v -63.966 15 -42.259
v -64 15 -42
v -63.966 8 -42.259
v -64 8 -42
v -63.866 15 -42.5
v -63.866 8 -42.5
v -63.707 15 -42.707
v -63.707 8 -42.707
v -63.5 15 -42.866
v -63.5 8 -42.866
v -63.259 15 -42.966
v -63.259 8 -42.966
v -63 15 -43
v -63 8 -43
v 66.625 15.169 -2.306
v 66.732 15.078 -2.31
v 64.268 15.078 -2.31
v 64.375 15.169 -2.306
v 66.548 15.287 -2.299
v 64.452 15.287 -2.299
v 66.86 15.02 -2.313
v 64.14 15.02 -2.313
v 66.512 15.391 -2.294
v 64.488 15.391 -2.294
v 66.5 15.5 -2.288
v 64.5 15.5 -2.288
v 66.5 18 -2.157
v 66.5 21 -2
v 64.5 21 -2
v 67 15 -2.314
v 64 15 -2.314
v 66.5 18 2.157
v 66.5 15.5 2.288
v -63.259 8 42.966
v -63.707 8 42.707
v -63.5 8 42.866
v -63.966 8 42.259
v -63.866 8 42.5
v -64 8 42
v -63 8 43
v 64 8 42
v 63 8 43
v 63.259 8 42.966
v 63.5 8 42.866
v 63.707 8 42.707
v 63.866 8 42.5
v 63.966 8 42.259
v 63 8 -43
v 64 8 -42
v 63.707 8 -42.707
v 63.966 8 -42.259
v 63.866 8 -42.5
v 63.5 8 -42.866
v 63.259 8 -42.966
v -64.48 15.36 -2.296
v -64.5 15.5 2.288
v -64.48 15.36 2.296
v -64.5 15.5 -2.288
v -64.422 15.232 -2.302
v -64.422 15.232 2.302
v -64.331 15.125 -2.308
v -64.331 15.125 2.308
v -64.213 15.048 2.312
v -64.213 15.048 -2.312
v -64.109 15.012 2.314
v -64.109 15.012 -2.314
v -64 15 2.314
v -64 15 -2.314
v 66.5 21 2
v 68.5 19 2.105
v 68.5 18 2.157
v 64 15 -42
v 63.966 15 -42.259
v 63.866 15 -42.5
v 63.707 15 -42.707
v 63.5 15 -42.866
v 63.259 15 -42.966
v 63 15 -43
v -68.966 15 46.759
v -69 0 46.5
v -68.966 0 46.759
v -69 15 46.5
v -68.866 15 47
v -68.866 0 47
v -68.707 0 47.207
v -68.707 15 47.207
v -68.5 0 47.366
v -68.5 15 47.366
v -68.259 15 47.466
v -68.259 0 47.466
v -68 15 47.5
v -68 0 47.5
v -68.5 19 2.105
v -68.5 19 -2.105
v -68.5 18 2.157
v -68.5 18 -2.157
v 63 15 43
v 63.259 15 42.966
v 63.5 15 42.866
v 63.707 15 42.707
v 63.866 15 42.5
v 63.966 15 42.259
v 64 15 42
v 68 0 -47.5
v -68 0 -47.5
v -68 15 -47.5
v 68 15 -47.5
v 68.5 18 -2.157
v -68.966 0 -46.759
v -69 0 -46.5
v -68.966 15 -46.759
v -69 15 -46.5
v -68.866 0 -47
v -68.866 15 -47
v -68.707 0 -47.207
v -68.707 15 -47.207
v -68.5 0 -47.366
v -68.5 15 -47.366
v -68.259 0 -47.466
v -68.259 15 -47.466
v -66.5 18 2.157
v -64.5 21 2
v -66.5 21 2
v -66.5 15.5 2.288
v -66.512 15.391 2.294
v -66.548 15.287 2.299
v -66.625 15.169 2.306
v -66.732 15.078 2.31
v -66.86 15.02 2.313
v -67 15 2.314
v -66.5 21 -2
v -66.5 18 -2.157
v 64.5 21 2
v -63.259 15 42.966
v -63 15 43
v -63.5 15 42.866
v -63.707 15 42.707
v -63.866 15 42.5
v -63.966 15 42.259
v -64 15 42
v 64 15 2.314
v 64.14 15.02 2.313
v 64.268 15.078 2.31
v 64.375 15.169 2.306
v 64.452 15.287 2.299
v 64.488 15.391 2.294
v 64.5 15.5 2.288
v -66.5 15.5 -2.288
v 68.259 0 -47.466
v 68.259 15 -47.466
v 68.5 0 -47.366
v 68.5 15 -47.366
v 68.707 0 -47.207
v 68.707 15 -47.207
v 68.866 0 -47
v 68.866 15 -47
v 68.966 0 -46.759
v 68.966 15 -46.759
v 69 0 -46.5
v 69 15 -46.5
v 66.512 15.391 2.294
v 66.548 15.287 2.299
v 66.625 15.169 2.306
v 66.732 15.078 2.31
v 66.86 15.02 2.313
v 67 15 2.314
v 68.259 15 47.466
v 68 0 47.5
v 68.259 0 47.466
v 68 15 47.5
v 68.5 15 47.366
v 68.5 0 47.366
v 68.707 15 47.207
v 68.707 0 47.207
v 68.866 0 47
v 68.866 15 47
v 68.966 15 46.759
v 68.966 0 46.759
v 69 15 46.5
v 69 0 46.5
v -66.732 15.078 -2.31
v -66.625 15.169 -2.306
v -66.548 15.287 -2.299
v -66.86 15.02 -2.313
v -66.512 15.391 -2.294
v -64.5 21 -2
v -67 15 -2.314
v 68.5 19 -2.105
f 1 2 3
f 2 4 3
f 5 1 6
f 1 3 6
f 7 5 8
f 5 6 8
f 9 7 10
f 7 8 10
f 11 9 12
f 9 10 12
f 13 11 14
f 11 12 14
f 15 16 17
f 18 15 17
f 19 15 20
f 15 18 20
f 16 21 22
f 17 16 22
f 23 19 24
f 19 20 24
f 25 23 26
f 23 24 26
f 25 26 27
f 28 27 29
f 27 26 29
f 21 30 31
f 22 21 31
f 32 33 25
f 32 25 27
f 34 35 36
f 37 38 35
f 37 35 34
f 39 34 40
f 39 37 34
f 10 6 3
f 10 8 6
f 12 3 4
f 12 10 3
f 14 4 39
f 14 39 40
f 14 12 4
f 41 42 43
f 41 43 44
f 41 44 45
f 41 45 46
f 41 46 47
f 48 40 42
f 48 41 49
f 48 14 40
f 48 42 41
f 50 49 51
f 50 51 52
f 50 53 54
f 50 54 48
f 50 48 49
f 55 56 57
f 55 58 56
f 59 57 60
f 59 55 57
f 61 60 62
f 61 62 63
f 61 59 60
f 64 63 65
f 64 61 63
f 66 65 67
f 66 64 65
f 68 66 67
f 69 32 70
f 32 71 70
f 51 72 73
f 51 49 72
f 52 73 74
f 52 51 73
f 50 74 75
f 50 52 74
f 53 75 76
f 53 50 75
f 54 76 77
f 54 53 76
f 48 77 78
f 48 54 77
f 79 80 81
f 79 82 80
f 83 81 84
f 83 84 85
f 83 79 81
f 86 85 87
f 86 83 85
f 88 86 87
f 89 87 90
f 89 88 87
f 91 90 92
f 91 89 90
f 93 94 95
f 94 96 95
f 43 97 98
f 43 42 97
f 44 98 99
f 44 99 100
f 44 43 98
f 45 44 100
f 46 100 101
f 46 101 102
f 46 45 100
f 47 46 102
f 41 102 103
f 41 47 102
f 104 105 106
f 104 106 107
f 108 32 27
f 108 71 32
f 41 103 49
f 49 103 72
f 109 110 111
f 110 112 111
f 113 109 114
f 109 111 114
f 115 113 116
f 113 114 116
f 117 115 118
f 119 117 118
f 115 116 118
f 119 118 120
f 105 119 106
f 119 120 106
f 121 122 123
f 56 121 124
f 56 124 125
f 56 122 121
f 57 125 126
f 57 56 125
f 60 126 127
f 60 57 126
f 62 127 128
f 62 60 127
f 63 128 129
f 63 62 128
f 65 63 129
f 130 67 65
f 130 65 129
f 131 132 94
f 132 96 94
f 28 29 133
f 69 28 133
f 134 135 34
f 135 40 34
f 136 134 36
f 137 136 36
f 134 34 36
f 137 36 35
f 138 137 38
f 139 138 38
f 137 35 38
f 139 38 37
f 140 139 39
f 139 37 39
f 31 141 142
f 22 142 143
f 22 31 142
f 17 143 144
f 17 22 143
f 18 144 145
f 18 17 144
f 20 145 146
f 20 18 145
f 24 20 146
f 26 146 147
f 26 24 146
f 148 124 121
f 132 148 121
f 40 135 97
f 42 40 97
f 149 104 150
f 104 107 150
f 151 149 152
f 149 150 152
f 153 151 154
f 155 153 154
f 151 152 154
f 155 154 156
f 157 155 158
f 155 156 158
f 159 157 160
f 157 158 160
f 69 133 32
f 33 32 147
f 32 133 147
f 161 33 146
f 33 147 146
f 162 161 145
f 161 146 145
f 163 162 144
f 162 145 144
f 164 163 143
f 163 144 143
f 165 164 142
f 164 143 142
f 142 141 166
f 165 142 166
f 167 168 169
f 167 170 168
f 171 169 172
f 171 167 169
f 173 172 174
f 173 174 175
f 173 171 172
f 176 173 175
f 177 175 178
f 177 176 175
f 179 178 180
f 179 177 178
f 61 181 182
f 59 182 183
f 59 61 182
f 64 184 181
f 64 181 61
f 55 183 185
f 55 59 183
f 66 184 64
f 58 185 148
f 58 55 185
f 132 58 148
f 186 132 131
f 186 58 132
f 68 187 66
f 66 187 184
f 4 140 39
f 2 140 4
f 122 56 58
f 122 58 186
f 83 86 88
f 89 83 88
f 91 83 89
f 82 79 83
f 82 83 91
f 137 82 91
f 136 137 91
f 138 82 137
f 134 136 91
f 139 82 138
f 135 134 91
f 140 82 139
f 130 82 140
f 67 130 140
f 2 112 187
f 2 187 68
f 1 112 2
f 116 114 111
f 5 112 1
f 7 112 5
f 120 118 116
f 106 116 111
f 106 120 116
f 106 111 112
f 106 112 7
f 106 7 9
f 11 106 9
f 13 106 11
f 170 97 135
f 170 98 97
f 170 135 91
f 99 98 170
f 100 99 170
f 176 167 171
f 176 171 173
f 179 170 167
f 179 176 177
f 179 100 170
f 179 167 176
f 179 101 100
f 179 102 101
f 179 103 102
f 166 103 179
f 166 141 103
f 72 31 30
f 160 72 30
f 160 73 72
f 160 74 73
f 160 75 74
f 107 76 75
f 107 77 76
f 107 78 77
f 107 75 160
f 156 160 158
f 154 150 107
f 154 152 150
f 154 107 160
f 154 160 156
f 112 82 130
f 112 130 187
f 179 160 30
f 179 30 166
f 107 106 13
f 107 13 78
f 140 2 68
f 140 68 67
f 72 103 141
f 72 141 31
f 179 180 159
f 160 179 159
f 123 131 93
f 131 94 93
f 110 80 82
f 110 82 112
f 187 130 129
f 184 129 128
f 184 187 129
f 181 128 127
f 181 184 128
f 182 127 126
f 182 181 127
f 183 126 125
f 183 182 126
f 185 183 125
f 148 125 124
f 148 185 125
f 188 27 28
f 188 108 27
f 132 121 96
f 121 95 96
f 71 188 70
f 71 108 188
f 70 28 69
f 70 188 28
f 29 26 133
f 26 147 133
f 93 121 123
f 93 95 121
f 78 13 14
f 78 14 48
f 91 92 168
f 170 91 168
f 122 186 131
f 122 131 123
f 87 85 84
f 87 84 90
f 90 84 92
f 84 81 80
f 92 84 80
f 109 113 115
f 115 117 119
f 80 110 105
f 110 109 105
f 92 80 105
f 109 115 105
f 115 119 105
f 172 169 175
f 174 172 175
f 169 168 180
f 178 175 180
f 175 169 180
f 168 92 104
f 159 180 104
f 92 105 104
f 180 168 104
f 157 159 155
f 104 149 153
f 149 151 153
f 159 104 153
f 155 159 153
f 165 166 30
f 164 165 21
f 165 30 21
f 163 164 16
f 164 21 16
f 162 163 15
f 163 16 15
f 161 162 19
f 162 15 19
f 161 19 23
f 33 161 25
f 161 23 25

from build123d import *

# Parameters (mm, degrees)
SKETCH1_W           = 138
SKETCH1_H           = 95
BOSS_EXTRUDE1_DEPTH = 15
SKETCH2_W           = 128
SKETCH2_H           = 86
CUT_EXTRUDE1_DEPTH  = 7
SNAP_START          = 64.5
SNAP_HOOK2_DEPTH    = 2
SNAP_HOOK2_2_DEPTH  = 2
FILLET1_R           = 1
FILLET2_R           = 0.5


with BuildPart() as part:
    # Sketch1 → Boss-Extrude1 (new body)
    with BuildSketch(Plane(origin=(0, 0, 0), x_dir=(1, 0, 0), z_dir=(0, 1, 0))):
        Rectangle(SKETCH1_W, SKETCH1_H)
    extrude(amount=BOSS_EXTRUDE1_DEPTH)

    # Sketch2 → Cut-Extrude1 (cut)
    with BuildSketch(Plane(origin=(0, 15, 0), x_dir=(1, 0, 0), z_dir=(0, 1, 0))):
        Rectangle(SKETCH2_W, SKETCH2_H)
    extrude(amount=-CUT_EXTRUDE1_DEPTH, mode=Mode.SUBTRACT)



with BuildPart() as body_2:
    # Snap Hook2: read off the stored shape, not the designer's step
    # Snap Hook2 outline → Snap Hook2 (new body)
    with BuildSketch(Plane.YZ.offset(SNAP_START)):
        Polygon((21, -2), (21, 2), (18, 2.157223338), (18, -2.157223338), align=None)
    snap_hook2 = extrude(amount=SNAP_HOOK2_DEPTH)


with BuildPart() as part_1:
    add(part.part)

    add(body_2.part)  # Snap Hook2 2 merges body 2
    # Snap Hook2 2 outline → Snap Hook2 2 (add)
    with BuildSketch(Plane.YZ.offset(SNAP_START)):
        Polygon((18, -2.157223338), (18, 2.157223338), (15, 2.314446676), (15, -2.314446676), align=None)
    snap_hook2_2 = extrude(amount=SNAP_HOOK2_2_DEPTH)

    # Snap Hook2 3: loft between two sections, ruled curve by curve
    snap_hook2_3_from = [
        Edge.make_line((66.5, 21, -2), (66.5, 21, 2)),
        Edge.make_line((66.5, 18, 2.157223338), (66.5, 18, -2.157223338)),
        Edge.make_line((66.5, 18, 2.157223338), (66.5, 21, 2)),
        Edge.make_line((66.5, 18, -2.157223338), (66.5, 21, -2)),
    ]
    snap_hook2_3_to = [
        Edge.make_line((68.5, 19, -2.104815559), (68.5, 19, 2.104815559)),
        Edge.make_line((68.5, 18, 2.157223338), (68.5, 18, -2.157223338)),
        Edge.make_line((68.5, 18, 2.157223338), (68.5, 19, 2.104815559)),
        Edge.make_line((68.5, 18, -2.157223338), (68.5, 19, -2.104815559)),
    ]
    snap_hook2_3 = Solid(Shell([*[Face.make_surface_from_curves(snap_hook2_3_from[k], snap_hook2_3_to[k]) for k in range(4)], Face(Wire(snap_hook2_3_from)), Face(Wire(snap_hook2_3_to))]))
    add(snap_hook2_3)

    # Fillet1
    fillet1_edges = [part_1.edges().sort_by_distance(p)[0] for p in [
        (64, 11.5, -43),
        (64, 11.5, 43),
        (-64, 11.5, 43),
        (-64, 11.5, -43),
        (-69, 7.5, -47.5),
        (69, 7.5, -47.5),
        (69, 7.5, 47.5),
        (-69, 7.5, 47.5),
    ]]
    fillet(fillet1_edges, radius=FILLET1_R)

    # Mirror1: Snap Hook2, Snap Hook2 2, Snap Hook2 3 across plane
    add(snap_hook2.mirror(Plane(origin=(0, 0, 0), x_dir=(0, 0, 1), z_dir=(1, 0, 0))))
    add(snap_hook2_2.mirror(Plane(origin=(0, 0, 0), x_dir=(0, 0, 1), z_dir=(1, 0, 0))))
    add(snap_hook2_3.mirror(Plane(origin=(0, 0, 0), x_dir=(0, 0, 1), z_dir=(1, 0, 0))))

    # Fillet2
    fillet2_edges = [part_1.edges().sort_by_distance(p)[0] for p in [
        (66.5, 15, 0),
        (64.5, 15, 0),
        (-66.5, 15, 0),
        (-64.5, 15, 0),
    ]]
    fillet(fillet2_edges, radius=FILLET2_R - 0.0001)  # a hair under: the kernel refuses the full size


solid = part_1.part
